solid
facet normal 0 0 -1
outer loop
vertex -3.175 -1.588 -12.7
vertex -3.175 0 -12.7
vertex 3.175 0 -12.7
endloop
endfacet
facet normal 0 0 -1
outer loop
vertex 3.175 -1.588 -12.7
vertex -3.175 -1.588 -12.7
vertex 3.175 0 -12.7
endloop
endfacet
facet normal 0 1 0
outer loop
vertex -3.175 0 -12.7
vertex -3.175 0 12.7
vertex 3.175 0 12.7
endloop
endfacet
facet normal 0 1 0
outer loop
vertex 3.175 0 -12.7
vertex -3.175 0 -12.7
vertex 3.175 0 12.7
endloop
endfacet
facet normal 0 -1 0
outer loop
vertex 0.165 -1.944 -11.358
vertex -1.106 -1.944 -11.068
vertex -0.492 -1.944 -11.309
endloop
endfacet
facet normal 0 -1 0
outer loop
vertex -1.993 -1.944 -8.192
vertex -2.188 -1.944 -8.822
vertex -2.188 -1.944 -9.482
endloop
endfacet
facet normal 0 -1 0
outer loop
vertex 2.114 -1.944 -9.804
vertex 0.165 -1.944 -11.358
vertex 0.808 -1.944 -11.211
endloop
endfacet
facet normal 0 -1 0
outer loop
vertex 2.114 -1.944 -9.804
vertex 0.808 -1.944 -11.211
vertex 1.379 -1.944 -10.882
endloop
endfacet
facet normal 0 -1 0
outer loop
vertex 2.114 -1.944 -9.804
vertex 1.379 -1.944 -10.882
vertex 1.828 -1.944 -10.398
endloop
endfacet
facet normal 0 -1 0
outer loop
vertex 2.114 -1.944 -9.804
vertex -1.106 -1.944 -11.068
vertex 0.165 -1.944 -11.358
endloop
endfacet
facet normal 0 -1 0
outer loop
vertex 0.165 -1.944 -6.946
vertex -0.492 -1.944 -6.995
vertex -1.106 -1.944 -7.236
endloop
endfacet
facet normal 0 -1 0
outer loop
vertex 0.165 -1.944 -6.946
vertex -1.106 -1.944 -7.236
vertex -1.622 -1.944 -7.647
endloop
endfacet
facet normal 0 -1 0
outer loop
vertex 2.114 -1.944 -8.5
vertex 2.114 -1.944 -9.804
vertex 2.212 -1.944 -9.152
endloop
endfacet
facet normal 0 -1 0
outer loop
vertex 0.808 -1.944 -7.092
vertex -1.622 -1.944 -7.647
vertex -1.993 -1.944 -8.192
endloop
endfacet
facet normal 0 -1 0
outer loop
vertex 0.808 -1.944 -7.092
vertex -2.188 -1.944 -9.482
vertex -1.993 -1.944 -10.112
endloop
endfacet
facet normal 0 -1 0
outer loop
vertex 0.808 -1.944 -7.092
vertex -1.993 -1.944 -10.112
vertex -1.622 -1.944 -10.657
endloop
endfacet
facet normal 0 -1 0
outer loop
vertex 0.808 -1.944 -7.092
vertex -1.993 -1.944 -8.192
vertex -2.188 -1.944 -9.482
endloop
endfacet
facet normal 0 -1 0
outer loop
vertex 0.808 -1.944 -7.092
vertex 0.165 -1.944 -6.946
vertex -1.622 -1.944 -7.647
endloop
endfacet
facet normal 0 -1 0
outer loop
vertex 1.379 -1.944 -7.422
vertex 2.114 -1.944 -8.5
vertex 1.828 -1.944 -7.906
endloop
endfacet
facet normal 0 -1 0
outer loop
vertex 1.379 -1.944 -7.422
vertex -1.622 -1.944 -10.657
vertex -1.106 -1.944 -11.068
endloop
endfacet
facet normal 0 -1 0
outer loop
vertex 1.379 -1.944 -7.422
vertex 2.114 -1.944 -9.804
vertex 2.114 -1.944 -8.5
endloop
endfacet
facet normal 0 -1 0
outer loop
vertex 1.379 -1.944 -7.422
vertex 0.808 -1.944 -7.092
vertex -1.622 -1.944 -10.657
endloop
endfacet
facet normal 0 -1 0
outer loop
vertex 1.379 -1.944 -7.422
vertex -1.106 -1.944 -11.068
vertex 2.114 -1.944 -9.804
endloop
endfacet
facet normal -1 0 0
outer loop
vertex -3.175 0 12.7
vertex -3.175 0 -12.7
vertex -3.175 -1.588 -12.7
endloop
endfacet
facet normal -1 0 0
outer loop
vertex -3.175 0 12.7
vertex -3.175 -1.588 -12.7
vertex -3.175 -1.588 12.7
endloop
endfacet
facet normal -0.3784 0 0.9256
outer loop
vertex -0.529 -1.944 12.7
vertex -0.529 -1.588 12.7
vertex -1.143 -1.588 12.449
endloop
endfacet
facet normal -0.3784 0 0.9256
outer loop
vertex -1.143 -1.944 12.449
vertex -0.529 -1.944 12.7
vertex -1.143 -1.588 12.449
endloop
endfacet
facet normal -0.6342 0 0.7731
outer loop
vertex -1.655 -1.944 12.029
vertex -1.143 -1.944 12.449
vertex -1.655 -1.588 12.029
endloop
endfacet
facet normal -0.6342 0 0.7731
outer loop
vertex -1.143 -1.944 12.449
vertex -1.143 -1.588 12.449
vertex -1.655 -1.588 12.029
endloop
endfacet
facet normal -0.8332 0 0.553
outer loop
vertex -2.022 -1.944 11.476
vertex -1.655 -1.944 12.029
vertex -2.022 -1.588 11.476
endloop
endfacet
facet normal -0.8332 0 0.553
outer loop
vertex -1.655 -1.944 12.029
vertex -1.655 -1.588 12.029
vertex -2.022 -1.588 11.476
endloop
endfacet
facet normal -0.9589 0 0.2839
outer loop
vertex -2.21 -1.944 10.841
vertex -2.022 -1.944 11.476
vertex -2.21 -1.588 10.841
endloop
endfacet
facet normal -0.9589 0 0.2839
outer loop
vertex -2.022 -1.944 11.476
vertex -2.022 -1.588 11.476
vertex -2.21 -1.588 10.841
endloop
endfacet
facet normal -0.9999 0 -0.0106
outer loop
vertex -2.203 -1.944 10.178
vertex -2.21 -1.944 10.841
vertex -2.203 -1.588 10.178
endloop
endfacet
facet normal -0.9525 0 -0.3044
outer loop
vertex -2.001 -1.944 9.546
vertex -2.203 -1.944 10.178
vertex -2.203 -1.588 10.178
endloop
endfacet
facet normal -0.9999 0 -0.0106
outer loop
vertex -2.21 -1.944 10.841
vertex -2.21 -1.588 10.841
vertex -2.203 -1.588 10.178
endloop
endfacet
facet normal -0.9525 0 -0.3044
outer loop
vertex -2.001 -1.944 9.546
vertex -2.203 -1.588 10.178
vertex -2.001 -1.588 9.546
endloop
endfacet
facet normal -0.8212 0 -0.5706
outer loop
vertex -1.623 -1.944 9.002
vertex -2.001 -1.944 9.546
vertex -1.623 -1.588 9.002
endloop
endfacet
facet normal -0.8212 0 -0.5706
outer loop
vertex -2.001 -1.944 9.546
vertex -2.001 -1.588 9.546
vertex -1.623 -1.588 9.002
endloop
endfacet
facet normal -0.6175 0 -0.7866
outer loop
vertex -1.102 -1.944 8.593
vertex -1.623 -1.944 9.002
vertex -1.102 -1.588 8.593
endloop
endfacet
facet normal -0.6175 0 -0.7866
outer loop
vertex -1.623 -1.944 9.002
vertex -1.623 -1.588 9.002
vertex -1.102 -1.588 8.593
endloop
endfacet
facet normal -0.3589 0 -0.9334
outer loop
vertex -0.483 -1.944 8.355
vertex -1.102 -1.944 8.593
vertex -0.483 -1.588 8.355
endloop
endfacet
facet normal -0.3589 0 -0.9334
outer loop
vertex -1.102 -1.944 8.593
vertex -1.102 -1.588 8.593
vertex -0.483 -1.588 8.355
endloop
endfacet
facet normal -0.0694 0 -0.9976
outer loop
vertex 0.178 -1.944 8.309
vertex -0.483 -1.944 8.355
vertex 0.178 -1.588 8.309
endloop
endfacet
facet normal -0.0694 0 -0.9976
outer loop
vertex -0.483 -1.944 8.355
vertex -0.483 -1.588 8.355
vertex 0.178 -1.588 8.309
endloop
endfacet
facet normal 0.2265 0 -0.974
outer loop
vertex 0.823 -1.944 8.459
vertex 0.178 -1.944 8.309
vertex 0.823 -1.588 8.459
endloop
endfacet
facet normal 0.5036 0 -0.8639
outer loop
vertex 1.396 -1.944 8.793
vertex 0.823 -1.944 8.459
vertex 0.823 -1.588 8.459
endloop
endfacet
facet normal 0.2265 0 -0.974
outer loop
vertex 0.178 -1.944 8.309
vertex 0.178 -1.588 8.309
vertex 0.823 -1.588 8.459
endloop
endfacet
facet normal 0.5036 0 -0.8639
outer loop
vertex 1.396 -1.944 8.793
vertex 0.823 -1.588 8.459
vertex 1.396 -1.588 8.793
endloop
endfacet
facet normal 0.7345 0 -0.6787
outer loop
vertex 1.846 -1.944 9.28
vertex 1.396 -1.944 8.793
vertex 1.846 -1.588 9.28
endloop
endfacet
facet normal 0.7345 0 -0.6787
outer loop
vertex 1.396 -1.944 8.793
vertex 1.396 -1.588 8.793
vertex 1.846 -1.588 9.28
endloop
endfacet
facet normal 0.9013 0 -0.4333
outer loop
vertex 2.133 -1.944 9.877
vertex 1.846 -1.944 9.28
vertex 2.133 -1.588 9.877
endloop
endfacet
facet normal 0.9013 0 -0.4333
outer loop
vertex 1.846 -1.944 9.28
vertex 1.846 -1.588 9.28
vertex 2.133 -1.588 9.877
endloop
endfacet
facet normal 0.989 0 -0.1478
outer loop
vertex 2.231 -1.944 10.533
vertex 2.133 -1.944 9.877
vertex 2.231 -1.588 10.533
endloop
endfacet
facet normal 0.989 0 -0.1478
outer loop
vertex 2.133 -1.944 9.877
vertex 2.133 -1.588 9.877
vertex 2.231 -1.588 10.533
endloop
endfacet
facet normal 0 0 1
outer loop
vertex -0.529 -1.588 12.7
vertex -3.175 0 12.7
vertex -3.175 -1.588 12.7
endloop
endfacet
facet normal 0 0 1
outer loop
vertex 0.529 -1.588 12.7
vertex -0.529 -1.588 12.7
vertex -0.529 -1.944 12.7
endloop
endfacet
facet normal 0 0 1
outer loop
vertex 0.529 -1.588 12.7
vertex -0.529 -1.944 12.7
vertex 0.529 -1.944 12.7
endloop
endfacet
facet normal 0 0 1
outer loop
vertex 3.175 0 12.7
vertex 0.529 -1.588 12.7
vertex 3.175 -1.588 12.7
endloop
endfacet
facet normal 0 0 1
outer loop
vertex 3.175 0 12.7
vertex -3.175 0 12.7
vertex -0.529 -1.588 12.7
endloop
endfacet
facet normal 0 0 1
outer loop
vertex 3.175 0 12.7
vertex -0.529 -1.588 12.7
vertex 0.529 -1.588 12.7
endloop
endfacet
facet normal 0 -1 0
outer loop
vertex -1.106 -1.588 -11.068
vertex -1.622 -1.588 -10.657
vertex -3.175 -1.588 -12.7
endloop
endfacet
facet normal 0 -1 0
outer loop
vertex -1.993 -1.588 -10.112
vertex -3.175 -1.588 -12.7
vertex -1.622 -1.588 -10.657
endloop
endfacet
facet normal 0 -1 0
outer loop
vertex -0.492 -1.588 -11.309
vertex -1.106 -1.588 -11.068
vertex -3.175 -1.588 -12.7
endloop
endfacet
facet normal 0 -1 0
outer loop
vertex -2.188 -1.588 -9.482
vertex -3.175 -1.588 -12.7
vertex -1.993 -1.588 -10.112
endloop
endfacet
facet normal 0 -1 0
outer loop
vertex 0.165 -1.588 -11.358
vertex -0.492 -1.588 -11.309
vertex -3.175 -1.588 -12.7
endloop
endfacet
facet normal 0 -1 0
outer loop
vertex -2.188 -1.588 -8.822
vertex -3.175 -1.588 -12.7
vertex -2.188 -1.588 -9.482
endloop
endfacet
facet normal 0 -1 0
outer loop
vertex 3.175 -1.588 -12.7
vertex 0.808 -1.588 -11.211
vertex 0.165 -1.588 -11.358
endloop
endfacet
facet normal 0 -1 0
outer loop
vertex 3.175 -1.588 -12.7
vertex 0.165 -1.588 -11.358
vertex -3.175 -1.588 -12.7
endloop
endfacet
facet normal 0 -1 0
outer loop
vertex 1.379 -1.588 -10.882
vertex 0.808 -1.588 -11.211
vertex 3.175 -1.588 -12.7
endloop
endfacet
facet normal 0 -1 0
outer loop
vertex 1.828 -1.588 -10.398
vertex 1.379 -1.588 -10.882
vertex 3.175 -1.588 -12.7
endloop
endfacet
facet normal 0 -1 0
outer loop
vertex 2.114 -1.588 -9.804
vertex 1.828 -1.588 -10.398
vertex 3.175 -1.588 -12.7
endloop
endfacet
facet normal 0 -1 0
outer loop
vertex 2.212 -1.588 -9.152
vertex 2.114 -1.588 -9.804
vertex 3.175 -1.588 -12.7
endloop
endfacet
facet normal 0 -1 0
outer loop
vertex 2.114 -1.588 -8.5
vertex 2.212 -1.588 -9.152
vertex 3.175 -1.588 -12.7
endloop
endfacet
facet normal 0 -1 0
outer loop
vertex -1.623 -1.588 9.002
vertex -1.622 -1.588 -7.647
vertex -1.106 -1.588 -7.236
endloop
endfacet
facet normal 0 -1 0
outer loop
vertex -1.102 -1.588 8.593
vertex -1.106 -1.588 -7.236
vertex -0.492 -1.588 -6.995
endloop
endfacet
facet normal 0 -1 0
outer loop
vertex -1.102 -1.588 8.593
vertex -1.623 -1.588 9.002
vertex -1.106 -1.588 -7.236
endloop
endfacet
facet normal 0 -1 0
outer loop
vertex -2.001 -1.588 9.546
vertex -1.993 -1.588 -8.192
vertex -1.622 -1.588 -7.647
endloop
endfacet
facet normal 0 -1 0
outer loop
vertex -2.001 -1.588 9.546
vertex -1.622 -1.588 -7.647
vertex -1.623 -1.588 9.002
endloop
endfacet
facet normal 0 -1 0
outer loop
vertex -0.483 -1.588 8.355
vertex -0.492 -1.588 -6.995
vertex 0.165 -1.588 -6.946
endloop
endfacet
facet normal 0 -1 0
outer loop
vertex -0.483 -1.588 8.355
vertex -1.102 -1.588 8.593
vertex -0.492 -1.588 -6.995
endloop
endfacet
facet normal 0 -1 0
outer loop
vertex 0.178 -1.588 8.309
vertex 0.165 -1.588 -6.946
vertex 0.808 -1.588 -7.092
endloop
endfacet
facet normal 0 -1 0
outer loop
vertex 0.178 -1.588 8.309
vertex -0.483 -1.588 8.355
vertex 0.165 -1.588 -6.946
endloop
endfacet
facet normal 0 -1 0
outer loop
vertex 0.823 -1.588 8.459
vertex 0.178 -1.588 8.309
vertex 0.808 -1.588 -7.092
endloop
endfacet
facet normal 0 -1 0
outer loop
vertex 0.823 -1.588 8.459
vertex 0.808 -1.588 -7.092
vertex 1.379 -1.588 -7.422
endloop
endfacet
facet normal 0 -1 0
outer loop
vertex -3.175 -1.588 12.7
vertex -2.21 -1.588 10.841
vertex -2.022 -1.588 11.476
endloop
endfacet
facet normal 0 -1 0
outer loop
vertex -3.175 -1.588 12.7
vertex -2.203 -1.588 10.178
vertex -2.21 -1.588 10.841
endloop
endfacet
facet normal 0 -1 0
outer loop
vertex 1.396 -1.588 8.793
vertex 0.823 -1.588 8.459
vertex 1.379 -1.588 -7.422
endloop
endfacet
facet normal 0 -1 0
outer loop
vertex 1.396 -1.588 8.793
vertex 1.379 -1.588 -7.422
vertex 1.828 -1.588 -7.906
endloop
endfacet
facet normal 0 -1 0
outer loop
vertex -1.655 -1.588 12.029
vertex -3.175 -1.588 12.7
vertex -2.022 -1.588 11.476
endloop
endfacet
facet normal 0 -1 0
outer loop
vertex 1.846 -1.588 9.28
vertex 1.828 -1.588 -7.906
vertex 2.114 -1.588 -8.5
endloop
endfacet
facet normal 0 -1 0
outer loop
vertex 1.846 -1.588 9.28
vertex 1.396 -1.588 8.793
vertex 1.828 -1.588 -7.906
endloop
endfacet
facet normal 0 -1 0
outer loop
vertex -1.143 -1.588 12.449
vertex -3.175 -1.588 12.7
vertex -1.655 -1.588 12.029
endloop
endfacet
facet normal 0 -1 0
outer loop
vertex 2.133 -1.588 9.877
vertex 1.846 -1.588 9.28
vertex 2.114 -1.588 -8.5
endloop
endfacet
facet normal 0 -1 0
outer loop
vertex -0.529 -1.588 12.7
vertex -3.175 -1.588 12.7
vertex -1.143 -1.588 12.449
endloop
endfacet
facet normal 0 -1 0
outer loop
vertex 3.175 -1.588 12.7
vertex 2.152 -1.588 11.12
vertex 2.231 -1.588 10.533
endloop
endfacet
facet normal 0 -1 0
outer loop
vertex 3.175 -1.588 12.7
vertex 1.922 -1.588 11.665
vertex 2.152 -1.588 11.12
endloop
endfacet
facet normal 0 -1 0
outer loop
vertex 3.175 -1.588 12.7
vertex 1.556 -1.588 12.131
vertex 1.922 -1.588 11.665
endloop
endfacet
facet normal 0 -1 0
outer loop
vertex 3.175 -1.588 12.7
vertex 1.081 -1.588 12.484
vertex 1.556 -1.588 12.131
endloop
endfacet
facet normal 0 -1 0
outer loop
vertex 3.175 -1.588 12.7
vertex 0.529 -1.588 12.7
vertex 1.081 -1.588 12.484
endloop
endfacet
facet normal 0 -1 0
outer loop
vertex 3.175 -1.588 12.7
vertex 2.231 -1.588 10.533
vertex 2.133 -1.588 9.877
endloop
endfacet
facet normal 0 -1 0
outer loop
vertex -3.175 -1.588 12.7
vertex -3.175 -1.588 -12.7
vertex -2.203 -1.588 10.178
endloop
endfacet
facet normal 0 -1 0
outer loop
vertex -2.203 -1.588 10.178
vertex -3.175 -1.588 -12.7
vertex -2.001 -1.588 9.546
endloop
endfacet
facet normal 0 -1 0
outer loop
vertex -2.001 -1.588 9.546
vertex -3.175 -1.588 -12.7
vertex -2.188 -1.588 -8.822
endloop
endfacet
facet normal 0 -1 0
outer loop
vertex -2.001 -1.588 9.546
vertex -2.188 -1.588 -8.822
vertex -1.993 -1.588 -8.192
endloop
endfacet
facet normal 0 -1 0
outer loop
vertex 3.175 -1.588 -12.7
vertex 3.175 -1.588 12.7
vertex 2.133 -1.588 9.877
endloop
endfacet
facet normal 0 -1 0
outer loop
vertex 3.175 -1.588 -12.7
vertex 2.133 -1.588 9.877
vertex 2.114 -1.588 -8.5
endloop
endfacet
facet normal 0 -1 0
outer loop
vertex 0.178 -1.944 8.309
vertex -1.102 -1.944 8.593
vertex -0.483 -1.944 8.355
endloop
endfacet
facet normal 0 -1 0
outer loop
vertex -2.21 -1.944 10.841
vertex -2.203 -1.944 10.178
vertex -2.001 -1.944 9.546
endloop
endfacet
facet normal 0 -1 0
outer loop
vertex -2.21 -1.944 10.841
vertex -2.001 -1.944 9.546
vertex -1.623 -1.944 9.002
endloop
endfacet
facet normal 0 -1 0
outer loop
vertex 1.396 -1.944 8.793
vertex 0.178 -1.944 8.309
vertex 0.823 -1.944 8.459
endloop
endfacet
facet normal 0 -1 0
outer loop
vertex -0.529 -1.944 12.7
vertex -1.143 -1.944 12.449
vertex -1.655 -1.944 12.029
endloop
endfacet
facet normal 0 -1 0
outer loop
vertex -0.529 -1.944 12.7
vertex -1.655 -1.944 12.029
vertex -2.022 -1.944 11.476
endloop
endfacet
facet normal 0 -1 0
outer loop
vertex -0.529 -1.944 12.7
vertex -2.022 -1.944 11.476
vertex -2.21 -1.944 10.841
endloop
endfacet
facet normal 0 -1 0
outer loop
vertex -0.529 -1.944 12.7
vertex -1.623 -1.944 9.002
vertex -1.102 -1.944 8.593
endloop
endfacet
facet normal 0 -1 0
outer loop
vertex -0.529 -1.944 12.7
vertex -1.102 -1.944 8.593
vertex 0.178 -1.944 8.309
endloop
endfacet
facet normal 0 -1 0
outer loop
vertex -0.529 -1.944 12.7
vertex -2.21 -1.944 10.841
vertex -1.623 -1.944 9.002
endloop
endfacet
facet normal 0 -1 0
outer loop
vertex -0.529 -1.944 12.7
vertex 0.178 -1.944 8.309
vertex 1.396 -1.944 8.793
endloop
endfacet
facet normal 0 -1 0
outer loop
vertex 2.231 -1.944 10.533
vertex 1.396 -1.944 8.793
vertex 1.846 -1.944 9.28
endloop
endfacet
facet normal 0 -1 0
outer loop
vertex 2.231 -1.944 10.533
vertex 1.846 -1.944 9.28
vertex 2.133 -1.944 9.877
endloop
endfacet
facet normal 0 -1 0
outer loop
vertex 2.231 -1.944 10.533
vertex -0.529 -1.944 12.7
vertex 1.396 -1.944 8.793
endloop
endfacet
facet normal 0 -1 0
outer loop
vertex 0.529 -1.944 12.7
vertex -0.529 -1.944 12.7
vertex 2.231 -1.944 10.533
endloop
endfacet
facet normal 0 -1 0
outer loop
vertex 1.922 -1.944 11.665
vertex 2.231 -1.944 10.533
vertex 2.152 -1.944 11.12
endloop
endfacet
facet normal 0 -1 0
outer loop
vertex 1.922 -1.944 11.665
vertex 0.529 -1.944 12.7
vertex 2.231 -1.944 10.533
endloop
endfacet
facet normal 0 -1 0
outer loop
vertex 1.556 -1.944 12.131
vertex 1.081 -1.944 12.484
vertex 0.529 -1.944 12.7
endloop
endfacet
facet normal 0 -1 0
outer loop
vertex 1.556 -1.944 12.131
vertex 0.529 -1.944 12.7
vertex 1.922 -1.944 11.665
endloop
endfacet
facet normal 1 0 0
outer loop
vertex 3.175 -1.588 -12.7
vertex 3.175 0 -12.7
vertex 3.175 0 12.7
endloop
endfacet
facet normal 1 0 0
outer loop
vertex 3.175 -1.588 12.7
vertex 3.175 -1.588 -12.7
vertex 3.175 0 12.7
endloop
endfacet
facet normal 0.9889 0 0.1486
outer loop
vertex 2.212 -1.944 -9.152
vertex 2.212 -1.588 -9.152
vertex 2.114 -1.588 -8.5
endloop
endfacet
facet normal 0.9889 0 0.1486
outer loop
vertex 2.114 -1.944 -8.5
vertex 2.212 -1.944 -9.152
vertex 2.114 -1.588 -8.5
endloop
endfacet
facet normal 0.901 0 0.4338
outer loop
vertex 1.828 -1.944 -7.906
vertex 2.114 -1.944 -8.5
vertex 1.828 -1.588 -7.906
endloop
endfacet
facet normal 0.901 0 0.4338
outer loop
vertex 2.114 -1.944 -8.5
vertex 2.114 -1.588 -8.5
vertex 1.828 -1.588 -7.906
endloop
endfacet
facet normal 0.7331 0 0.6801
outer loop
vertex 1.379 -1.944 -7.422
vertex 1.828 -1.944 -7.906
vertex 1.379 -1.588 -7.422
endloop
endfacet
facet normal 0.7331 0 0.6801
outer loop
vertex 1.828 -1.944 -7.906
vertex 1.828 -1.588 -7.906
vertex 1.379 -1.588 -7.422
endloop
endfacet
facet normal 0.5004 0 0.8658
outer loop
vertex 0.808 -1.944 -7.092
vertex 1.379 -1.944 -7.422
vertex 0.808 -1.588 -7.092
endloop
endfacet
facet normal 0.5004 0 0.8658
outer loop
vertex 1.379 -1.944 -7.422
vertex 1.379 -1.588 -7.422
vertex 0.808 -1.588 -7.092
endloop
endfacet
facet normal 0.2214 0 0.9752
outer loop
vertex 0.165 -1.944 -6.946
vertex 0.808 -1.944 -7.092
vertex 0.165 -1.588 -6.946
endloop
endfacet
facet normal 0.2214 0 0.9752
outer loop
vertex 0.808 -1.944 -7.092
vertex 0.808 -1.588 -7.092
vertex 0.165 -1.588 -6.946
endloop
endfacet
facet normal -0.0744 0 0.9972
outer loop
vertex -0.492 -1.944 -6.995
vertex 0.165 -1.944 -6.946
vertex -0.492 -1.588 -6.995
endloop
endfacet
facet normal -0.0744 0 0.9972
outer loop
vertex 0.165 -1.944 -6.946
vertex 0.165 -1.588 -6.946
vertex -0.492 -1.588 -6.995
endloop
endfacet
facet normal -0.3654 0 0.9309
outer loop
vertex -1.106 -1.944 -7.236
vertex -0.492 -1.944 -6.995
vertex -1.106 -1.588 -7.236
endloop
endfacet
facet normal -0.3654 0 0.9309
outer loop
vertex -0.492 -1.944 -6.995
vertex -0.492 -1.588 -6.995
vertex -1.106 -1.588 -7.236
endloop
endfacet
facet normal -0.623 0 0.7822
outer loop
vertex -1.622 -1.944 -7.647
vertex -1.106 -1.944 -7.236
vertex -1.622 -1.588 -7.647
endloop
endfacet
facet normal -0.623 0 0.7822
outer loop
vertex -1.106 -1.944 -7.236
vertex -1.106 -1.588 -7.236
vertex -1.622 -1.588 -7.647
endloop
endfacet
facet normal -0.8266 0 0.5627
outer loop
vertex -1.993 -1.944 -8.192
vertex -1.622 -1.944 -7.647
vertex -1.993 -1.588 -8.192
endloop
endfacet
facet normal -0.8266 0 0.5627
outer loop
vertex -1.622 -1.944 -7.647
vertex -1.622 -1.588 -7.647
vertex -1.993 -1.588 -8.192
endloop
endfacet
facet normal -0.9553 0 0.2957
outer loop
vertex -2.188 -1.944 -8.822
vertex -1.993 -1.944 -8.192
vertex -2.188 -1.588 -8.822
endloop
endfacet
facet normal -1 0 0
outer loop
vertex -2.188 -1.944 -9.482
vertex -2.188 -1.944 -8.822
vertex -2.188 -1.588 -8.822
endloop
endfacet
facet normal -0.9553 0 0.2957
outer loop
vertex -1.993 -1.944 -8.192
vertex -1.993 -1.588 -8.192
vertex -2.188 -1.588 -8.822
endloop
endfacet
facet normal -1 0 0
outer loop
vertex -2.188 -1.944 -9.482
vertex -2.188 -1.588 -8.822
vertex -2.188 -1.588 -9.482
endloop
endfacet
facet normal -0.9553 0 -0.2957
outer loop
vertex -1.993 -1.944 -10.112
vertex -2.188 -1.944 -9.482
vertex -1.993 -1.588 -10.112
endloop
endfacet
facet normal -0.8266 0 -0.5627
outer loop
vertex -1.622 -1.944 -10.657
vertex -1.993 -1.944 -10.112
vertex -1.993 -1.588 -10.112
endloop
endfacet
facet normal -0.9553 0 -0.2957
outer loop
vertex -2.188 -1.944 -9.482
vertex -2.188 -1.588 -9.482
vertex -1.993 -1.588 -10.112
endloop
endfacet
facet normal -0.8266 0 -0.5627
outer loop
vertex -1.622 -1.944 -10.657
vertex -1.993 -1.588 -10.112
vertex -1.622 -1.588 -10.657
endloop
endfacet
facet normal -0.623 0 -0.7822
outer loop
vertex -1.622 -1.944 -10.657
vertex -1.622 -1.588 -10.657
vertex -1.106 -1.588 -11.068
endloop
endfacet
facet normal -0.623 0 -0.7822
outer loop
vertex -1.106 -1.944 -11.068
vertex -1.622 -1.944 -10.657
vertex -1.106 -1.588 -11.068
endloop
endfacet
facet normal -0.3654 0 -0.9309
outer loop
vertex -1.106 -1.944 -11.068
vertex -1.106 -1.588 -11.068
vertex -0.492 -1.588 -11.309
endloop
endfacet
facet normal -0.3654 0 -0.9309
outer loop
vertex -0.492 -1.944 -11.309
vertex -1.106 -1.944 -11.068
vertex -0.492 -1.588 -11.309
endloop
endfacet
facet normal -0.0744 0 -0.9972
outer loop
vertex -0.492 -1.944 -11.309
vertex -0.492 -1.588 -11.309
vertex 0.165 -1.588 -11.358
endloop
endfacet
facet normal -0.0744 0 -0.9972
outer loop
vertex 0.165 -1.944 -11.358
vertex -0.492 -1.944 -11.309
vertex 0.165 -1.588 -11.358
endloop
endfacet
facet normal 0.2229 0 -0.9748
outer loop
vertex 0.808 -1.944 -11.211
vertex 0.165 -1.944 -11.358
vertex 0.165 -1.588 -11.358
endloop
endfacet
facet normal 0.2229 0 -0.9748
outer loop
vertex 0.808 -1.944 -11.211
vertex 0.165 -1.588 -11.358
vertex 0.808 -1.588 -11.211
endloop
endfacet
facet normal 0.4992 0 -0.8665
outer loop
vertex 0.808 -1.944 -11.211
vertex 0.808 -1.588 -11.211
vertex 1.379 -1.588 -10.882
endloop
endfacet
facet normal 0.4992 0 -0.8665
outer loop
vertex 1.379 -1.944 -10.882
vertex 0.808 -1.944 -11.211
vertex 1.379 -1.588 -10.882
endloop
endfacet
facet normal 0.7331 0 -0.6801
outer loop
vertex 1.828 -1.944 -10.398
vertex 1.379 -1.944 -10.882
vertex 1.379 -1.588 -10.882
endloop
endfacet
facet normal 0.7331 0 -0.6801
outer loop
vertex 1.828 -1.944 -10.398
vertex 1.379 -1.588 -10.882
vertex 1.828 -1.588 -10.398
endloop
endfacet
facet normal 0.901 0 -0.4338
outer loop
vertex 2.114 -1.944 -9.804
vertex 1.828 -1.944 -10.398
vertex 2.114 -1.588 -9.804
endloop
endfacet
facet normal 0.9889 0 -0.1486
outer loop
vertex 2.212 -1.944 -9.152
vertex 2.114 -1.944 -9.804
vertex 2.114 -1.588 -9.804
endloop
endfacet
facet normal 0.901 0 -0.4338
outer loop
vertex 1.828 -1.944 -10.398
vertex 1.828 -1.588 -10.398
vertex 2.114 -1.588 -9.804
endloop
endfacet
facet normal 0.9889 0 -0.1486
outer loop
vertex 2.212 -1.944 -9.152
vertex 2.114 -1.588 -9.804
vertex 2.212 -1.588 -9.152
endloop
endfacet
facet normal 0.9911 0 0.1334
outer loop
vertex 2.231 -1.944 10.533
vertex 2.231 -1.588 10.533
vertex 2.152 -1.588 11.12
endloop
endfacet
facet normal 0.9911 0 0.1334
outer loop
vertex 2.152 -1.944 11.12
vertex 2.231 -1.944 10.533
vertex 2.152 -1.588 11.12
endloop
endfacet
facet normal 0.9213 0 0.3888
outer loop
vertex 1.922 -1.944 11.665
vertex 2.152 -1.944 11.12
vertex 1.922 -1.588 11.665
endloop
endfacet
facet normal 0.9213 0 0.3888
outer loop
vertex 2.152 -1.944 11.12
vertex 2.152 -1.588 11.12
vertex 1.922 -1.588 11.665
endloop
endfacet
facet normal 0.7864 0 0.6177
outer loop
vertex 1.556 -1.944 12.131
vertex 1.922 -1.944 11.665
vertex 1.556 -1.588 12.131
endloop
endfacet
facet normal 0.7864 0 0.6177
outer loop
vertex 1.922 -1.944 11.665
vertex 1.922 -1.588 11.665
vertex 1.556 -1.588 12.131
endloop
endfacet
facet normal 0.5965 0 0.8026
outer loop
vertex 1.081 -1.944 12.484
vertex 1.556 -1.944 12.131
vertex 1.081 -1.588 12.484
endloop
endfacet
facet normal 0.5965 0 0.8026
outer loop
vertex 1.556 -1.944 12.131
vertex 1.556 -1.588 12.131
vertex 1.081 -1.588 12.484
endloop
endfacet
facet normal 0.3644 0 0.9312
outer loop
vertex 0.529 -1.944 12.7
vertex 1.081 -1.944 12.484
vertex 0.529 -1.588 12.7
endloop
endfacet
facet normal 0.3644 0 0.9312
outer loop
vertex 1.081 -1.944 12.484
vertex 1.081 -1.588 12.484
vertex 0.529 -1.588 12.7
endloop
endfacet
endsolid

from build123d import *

# Parameters (mm, degrees)
F0_W     = 6.35
F0_H     = 25.4
F1_DEPTH = 1.5875
F2_R     = 2.21245533
F3_DEPTH = 0.3560978221


with BuildPart() as f1:
    # F0 (on Front) → F1 (new body)
    with BuildSketch(Plane.XZ):
        Rectangle(F0_W, F0_H)
    extrude(amount=F1_DEPTH)

    # F2 (on face) → F3 (join)
    with BuildSketch(Plane.XZ.offset(1.5875)):
        with Locations((0, -9.151885286)):
            Circle(F2_R)
        with BuildLine():
            ThreePointArc((-0.5292957498, 12.7), (-1.3777807408, 8.7779312566), (2.2310145846, 10.5326808989))
            ThreePointArc((2.2310145846, 10.5326808989), (1.7547496423, 11.9104616397), (0.5292957498, 12.7))
            Line((0.5292957498, 12.7), (-0.5292957498, 12.7))
        make_face()
    extrude(amount=F3_DEPTH)


solid = f1.part
